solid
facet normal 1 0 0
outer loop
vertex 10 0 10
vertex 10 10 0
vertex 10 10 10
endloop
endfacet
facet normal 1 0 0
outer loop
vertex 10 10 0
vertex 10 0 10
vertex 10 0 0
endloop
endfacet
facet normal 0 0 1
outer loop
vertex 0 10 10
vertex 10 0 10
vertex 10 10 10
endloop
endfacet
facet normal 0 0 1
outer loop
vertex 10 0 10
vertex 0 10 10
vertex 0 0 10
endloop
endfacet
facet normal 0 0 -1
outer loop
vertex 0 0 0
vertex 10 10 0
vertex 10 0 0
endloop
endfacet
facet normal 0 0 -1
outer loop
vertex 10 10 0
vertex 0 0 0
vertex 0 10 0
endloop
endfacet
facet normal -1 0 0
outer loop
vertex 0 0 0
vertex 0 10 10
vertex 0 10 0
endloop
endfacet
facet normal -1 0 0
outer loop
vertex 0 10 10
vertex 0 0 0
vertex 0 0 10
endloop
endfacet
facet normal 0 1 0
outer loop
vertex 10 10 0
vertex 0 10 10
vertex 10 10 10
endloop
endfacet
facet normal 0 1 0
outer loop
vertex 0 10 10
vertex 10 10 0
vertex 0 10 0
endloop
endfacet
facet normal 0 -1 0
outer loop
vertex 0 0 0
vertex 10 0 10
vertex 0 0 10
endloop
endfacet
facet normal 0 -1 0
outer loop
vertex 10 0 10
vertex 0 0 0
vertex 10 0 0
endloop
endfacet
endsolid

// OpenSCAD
//include <MCAD/units.scad>
//include <MCAD/boxes.scad>


x = 10;
y = 10;
z = 10;


rail_x = 5;
rail_y = 7;

gap_x = x-rail_x;
gap_y = y-rail_y;



color("red",0.4)
cube([x,y,z]);

color("green",0.4)
translate([0,0,0])cube([rail_x,rail_y,z]);
